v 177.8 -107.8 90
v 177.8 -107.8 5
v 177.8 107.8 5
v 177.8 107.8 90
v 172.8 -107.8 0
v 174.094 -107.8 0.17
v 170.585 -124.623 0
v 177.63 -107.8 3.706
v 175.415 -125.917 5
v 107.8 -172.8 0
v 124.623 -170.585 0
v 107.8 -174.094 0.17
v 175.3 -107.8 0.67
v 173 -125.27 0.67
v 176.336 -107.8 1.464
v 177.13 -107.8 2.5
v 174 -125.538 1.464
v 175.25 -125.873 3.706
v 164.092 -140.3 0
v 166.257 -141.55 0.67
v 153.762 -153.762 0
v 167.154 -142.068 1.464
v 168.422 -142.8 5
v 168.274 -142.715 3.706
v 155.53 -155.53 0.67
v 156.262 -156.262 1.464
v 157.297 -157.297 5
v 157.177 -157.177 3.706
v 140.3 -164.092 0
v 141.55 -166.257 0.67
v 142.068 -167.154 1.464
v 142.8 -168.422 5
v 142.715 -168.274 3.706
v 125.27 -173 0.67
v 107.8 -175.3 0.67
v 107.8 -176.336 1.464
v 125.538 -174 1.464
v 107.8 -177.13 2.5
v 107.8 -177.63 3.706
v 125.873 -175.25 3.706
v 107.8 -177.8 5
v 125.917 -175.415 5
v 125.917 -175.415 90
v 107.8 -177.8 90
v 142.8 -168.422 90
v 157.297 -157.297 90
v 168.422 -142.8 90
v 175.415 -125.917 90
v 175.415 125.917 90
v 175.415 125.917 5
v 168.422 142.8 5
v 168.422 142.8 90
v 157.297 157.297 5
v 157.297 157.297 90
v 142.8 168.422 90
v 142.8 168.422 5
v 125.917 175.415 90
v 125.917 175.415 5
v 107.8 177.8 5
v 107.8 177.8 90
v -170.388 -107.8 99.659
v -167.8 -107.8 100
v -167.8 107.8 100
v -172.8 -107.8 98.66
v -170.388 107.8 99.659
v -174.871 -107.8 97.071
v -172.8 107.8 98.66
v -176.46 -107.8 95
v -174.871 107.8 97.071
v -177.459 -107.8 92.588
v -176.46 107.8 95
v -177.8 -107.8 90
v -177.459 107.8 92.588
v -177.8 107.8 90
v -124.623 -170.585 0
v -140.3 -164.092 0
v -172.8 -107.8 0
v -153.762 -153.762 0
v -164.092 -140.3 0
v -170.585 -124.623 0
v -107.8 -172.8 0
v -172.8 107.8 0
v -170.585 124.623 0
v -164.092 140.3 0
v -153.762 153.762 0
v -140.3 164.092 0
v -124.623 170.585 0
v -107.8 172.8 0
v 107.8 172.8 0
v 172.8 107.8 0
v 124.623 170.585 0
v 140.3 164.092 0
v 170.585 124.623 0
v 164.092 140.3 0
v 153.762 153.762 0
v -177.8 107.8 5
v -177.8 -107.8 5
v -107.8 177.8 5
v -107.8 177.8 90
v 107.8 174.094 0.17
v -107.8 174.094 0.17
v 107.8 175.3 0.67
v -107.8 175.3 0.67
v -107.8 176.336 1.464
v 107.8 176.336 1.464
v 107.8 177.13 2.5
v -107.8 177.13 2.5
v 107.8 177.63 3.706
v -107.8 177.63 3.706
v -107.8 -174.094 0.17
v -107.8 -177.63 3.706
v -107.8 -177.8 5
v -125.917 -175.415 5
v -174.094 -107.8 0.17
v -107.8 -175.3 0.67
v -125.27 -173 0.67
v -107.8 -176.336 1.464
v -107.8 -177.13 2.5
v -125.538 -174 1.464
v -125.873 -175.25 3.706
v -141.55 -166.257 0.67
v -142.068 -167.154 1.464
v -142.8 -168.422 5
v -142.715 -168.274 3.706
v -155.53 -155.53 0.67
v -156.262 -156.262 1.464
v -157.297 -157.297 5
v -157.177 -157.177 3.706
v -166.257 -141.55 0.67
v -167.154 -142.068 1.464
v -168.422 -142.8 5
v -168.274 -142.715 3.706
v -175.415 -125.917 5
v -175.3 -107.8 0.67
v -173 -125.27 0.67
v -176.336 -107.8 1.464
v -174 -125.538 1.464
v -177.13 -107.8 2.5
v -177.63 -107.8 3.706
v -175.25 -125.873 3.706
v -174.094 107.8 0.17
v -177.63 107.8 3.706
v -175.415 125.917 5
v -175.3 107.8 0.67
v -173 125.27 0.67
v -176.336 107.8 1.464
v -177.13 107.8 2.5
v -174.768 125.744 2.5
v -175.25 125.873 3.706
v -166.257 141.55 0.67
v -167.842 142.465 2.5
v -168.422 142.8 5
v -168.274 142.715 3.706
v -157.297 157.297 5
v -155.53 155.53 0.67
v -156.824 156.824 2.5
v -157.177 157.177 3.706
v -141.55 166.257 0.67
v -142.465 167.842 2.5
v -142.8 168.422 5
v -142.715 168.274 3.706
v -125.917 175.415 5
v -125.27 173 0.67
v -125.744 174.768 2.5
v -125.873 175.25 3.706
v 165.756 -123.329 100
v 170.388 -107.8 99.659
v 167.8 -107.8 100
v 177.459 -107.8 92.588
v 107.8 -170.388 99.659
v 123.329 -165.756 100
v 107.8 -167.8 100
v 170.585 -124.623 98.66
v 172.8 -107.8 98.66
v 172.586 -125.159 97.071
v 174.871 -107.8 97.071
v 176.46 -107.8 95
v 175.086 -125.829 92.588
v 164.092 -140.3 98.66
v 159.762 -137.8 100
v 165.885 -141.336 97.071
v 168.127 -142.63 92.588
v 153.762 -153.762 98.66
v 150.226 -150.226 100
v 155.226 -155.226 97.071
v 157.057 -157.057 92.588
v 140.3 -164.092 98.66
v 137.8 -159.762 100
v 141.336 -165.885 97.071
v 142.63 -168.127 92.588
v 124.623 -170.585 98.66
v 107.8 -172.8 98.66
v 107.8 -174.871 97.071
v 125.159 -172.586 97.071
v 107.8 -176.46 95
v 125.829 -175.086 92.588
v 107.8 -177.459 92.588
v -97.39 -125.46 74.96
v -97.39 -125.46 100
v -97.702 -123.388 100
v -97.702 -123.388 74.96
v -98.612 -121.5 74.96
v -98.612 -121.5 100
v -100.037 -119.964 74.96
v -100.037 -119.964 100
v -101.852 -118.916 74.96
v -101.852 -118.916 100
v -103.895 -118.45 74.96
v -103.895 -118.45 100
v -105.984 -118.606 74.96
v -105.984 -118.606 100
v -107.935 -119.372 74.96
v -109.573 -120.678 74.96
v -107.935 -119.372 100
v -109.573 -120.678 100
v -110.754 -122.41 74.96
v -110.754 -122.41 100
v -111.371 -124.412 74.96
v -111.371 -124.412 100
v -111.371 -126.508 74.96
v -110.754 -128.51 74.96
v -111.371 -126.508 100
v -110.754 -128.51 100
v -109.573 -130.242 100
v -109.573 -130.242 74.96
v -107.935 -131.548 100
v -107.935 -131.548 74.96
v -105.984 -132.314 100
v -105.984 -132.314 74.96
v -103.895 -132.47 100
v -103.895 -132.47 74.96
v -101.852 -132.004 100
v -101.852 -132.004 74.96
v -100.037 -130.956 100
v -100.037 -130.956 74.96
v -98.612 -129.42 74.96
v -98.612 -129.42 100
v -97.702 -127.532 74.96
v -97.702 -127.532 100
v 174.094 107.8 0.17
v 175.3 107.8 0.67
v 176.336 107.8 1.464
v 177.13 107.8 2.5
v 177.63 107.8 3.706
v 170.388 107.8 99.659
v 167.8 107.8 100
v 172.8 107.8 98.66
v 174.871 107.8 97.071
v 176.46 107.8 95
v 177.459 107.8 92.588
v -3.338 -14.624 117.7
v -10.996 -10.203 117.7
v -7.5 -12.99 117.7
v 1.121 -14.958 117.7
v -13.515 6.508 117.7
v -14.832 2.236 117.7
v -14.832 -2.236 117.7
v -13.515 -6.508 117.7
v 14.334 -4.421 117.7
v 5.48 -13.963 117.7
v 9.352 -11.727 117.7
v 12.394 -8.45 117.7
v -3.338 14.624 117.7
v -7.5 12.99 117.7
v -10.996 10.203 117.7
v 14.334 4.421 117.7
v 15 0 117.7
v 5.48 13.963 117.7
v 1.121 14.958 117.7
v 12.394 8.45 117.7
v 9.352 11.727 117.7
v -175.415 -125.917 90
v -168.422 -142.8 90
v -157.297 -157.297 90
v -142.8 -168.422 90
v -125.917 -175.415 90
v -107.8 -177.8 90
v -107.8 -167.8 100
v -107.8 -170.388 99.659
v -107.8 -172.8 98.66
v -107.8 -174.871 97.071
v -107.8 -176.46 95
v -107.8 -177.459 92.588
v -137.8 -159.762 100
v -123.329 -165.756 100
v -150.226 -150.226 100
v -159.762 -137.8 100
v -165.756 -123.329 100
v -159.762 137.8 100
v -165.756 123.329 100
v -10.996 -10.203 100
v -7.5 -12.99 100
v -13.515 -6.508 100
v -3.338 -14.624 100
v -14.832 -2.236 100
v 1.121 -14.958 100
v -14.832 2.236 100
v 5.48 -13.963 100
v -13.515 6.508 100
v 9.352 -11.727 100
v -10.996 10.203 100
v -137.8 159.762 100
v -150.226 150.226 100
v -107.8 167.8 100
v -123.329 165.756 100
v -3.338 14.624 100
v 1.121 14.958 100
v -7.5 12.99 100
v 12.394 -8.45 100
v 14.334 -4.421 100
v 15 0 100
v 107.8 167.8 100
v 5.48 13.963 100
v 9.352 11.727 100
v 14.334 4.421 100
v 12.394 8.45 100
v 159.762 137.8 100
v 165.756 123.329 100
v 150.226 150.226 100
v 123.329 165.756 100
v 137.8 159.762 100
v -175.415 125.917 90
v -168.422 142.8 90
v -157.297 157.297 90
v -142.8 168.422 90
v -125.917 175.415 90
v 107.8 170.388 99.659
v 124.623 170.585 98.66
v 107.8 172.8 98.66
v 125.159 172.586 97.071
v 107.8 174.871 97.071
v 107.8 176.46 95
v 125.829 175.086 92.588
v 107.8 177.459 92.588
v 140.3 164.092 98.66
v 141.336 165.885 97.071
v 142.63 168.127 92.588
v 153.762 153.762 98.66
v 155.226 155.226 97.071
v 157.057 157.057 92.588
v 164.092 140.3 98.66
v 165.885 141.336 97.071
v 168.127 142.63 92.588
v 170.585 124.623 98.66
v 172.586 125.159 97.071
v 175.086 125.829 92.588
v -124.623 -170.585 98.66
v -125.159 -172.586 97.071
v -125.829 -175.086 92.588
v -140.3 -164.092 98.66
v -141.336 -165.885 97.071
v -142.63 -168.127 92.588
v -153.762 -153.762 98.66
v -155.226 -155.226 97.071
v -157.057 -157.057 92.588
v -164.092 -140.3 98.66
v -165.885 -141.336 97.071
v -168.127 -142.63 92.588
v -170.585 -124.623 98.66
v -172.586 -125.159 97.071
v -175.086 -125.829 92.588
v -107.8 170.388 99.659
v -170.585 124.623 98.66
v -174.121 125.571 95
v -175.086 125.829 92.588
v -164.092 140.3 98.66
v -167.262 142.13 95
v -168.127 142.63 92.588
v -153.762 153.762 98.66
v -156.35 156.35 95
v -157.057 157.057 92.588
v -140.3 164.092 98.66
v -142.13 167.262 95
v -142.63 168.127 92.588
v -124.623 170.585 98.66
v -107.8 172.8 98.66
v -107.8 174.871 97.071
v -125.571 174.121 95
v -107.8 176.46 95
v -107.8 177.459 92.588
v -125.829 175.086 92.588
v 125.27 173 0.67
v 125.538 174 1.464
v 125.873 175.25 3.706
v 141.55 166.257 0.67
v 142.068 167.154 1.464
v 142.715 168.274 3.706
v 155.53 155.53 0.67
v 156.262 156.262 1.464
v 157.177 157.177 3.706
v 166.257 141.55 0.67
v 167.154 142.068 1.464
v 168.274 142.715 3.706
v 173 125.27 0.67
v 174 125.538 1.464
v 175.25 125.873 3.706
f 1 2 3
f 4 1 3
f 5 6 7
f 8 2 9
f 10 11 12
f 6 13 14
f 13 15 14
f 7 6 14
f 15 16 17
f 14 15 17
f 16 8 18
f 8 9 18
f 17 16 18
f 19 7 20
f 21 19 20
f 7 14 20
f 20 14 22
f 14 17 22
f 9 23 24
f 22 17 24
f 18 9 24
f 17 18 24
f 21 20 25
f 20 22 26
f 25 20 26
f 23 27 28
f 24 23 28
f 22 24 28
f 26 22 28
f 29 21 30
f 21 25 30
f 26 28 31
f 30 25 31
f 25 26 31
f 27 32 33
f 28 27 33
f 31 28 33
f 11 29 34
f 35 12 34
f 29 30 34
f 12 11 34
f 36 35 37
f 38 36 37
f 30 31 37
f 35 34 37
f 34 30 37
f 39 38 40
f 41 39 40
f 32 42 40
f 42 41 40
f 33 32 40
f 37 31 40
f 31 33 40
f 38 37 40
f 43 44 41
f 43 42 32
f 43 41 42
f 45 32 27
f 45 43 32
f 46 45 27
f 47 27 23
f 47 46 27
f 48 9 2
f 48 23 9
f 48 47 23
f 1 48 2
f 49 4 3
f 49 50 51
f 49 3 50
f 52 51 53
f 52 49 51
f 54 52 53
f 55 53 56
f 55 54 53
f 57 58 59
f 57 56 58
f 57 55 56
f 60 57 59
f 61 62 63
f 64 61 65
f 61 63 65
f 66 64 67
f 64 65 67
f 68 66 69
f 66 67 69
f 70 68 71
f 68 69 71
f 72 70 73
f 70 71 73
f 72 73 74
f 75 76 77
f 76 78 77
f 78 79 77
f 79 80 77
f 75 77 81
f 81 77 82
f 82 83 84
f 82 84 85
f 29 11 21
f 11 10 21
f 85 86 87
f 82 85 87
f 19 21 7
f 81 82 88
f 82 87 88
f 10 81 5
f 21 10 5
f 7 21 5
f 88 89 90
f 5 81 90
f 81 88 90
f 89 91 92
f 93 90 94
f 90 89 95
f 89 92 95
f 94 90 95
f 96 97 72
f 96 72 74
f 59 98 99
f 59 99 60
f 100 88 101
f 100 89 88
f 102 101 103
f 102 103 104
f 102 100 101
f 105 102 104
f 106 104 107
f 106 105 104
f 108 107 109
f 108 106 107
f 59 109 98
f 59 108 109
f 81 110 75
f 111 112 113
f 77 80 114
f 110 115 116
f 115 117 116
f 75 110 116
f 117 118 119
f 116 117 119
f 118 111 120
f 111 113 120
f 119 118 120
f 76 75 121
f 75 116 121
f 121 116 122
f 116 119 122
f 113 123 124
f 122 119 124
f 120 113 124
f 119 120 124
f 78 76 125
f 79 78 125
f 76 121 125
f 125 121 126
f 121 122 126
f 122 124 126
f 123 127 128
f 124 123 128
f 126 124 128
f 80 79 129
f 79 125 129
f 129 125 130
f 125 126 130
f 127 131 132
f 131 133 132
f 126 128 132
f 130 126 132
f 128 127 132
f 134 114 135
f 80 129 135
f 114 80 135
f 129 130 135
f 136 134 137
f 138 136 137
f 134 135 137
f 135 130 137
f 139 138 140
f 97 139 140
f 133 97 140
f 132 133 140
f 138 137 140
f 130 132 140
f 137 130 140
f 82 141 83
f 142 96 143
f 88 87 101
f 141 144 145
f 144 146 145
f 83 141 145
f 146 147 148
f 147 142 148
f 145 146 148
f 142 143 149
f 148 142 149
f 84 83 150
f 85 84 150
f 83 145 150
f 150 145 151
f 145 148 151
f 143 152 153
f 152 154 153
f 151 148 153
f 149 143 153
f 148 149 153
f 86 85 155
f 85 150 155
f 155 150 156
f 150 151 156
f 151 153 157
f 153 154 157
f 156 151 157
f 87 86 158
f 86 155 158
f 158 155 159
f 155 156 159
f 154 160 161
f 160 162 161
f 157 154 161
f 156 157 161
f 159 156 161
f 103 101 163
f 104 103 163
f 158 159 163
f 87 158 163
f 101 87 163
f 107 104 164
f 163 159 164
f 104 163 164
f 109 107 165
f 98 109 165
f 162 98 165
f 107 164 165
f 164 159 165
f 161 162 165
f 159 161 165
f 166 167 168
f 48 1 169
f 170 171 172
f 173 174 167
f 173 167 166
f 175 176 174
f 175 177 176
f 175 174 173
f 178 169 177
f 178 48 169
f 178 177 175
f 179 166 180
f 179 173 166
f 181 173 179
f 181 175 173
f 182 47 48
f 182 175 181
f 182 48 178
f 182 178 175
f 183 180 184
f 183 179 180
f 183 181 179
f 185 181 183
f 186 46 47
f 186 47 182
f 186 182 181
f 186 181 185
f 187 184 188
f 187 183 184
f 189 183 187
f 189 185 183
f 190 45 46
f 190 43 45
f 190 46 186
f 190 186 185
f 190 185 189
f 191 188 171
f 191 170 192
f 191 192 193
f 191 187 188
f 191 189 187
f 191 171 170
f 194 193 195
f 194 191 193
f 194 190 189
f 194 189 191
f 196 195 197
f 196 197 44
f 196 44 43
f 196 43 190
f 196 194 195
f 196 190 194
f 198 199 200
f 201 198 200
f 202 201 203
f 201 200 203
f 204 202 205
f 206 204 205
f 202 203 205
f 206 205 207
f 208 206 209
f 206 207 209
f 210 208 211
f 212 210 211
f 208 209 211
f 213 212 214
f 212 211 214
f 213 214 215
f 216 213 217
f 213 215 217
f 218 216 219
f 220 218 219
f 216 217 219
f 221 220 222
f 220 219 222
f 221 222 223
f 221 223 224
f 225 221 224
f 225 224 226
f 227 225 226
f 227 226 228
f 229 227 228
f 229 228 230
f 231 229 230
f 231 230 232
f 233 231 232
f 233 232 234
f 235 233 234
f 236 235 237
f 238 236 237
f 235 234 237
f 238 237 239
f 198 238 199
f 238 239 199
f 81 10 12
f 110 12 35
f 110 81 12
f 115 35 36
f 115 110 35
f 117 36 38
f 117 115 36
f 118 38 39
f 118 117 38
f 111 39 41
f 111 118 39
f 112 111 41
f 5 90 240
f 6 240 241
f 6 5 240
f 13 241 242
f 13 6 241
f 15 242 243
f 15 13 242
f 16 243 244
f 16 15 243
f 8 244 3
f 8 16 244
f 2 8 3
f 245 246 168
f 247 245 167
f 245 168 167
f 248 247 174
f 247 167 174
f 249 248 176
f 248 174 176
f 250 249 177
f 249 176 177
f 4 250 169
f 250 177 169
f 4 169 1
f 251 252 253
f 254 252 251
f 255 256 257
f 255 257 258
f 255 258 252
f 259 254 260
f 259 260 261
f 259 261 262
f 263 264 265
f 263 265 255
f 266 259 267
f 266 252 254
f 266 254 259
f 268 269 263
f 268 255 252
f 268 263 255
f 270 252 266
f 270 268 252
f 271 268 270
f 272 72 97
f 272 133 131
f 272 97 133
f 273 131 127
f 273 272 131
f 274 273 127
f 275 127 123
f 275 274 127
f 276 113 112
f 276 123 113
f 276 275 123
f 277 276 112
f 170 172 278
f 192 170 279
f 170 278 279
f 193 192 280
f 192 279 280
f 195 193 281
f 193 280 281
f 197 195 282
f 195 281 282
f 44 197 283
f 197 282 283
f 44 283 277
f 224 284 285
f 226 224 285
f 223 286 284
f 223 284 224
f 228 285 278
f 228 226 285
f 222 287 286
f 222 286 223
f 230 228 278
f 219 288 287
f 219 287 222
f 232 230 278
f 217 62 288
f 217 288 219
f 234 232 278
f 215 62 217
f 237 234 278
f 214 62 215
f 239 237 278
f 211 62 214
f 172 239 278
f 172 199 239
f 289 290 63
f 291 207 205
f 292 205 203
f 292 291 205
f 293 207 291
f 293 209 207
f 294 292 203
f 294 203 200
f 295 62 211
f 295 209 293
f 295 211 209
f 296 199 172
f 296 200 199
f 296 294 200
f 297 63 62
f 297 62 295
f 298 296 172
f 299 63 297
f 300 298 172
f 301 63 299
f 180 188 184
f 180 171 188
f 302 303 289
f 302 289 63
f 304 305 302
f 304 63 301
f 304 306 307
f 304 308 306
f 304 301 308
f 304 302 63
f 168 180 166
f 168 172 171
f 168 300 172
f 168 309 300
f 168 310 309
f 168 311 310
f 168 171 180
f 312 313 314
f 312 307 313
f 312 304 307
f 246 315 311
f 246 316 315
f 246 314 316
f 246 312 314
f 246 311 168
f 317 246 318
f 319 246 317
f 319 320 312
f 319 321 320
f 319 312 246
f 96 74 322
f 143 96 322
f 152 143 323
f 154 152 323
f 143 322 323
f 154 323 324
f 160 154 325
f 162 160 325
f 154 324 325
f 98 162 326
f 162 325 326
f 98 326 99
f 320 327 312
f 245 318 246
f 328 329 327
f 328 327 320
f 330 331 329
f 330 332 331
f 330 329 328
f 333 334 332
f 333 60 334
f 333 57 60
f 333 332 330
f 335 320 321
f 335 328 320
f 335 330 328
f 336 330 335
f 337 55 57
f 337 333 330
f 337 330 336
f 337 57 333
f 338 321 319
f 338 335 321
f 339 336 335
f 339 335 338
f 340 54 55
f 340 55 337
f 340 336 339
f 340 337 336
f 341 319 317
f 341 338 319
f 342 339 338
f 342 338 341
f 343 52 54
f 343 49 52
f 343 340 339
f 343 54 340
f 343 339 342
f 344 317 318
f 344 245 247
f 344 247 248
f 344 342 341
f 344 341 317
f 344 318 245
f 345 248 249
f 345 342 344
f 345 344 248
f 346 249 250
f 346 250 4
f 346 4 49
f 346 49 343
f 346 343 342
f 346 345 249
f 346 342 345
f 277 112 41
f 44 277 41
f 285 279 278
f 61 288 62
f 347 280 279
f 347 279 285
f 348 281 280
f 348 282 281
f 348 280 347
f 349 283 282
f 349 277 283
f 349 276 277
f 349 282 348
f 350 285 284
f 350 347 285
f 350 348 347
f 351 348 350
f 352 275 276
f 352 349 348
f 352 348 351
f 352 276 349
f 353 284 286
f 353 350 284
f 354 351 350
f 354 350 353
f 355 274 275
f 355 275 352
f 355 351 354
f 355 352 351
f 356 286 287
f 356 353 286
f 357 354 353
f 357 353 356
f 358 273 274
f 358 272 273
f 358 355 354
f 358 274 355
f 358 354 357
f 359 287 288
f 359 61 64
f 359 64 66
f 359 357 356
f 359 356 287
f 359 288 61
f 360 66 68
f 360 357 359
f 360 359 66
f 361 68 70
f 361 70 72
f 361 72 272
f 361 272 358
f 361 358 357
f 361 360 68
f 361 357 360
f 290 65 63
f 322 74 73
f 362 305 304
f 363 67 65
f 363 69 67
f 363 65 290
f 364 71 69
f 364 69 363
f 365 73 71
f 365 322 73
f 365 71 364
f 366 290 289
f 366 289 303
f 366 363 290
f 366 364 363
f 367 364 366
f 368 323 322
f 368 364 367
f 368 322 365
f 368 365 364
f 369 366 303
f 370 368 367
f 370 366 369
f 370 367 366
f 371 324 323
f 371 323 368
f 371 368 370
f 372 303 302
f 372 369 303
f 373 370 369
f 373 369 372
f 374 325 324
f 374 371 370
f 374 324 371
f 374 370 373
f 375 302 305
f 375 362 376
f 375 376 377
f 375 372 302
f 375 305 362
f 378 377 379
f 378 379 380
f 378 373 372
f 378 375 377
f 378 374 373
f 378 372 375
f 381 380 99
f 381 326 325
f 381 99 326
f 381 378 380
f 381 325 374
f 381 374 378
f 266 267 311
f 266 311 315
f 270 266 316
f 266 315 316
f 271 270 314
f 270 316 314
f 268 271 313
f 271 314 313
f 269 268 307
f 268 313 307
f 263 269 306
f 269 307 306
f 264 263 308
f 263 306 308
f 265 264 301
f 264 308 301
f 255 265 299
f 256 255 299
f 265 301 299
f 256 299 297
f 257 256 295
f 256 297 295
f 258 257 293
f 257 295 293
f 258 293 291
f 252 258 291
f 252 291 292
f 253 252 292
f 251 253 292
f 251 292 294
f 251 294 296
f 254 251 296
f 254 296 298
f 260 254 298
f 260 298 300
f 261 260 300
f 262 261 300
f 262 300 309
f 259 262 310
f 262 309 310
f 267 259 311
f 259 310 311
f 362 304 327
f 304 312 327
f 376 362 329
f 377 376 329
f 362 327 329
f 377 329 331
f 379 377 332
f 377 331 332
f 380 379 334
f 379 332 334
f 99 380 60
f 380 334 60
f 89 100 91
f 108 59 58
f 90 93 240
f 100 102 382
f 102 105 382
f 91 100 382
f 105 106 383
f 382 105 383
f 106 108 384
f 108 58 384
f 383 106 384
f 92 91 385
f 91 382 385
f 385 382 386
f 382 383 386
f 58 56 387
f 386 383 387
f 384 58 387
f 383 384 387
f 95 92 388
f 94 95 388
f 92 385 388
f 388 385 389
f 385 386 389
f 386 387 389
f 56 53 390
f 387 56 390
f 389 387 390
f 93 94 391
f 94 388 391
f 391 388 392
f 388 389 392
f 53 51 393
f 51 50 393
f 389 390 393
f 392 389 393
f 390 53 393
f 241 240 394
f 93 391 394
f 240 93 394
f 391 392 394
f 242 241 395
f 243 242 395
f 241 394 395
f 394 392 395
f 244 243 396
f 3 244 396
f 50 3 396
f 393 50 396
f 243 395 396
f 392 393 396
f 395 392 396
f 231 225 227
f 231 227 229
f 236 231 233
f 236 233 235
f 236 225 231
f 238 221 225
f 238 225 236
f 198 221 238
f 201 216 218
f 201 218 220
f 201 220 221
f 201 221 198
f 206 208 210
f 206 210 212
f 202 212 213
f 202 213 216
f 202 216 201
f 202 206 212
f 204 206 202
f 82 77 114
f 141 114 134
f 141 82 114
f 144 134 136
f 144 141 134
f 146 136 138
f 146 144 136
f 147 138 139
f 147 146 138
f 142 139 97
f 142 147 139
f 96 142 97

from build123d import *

# Parameters (mm, degrees)
SKETCH1_W           = 355.6
SKETCH1_H           = 355.6
BOSS_EXTRUDE1_DEPTH = 100
FILLET1_R           = 70
SKETCH2_R           = 7.03
CUT_EXTRUDE1_DEPTH  = 25.04
FILLET3_R           = 5
FILLET4_R           = 10
SKETCH3_R           = 15
BOSS_EXTRUDE2_DEPTH = 17.7


with BuildPart() as part:
    # Sketch1 → Boss-Extrude1 (new body)
    with BuildSketch(Plane.XY):
        Rectangle(SKETCH1_W, SKETCH1_H)
    extrude(amount=BOSS_EXTRUDE1_DEPTH)

    # Fillet1
    fillet1_edges = [part.edges().sort_by_distance(p)[0] for p in [
        (-177.8, -177.8, 50),
        (-177.8, 177.8, 50),
        (177.8, 177.8, 50),
        (177.8, -177.8, 50),
    ]]
    fillet(fillet1_edges, radius=FILLET1_R)

    # Sketch2 → Cut-Extrude1 (cut)
    with BuildSketch(Plane.XY.offset(100)):
        with Locations((-104.42, -125.46)):
            Circle(SKETCH2_R)
    extrude(amount=-CUT_EXTRUDE1_DEPTH, mode=Mode.SUBTRACT)

    # Fillet3
    fillet3_edges = [part.edges().sort_by_distance(p)[0] for p in [
        (0, 177.8, 0),
        (177.8, 0, 0),
        (0, -177.8, 0),
        (-177.8, 0, 0),
        (-157.297474683, 157.297474683, 0),
        (-157.297474683, -157.297474683, 0),
        (157.297474683, -157.297474683, 0),
        (157.297474683, 157.297474683, 0),
    ]]
    fillet(fillet3_edges, radius=FILLET3_R)

    # Fillet4
    fillet4_edges = [part.edges().sort_by_distance(p)[0] for p in [
        (0, 177.8, 100),
        (177.8, 0, 100),
        (-177.8, 0, 100),
        (0, -177.8, 100),
        (-157.297474683, 157.297474683, 100),
        (-157.297474683, -157.297474683, 100),
        (157.297474683, -157.297474683, 100),
        (157.297474683, 157.297474683, 100),
    ]]
    fillet(fillet4_edges, radius=FILLET4_R)

    # Sketch3 → Boss-Extrude2 (add)
    with BuildSketch(Plane.XY.offset(100)):
        Circle(SKETCH3_R)
    extrude(amount=BOSS_EXTRUDE2_DEPTH)


solid = part.part
